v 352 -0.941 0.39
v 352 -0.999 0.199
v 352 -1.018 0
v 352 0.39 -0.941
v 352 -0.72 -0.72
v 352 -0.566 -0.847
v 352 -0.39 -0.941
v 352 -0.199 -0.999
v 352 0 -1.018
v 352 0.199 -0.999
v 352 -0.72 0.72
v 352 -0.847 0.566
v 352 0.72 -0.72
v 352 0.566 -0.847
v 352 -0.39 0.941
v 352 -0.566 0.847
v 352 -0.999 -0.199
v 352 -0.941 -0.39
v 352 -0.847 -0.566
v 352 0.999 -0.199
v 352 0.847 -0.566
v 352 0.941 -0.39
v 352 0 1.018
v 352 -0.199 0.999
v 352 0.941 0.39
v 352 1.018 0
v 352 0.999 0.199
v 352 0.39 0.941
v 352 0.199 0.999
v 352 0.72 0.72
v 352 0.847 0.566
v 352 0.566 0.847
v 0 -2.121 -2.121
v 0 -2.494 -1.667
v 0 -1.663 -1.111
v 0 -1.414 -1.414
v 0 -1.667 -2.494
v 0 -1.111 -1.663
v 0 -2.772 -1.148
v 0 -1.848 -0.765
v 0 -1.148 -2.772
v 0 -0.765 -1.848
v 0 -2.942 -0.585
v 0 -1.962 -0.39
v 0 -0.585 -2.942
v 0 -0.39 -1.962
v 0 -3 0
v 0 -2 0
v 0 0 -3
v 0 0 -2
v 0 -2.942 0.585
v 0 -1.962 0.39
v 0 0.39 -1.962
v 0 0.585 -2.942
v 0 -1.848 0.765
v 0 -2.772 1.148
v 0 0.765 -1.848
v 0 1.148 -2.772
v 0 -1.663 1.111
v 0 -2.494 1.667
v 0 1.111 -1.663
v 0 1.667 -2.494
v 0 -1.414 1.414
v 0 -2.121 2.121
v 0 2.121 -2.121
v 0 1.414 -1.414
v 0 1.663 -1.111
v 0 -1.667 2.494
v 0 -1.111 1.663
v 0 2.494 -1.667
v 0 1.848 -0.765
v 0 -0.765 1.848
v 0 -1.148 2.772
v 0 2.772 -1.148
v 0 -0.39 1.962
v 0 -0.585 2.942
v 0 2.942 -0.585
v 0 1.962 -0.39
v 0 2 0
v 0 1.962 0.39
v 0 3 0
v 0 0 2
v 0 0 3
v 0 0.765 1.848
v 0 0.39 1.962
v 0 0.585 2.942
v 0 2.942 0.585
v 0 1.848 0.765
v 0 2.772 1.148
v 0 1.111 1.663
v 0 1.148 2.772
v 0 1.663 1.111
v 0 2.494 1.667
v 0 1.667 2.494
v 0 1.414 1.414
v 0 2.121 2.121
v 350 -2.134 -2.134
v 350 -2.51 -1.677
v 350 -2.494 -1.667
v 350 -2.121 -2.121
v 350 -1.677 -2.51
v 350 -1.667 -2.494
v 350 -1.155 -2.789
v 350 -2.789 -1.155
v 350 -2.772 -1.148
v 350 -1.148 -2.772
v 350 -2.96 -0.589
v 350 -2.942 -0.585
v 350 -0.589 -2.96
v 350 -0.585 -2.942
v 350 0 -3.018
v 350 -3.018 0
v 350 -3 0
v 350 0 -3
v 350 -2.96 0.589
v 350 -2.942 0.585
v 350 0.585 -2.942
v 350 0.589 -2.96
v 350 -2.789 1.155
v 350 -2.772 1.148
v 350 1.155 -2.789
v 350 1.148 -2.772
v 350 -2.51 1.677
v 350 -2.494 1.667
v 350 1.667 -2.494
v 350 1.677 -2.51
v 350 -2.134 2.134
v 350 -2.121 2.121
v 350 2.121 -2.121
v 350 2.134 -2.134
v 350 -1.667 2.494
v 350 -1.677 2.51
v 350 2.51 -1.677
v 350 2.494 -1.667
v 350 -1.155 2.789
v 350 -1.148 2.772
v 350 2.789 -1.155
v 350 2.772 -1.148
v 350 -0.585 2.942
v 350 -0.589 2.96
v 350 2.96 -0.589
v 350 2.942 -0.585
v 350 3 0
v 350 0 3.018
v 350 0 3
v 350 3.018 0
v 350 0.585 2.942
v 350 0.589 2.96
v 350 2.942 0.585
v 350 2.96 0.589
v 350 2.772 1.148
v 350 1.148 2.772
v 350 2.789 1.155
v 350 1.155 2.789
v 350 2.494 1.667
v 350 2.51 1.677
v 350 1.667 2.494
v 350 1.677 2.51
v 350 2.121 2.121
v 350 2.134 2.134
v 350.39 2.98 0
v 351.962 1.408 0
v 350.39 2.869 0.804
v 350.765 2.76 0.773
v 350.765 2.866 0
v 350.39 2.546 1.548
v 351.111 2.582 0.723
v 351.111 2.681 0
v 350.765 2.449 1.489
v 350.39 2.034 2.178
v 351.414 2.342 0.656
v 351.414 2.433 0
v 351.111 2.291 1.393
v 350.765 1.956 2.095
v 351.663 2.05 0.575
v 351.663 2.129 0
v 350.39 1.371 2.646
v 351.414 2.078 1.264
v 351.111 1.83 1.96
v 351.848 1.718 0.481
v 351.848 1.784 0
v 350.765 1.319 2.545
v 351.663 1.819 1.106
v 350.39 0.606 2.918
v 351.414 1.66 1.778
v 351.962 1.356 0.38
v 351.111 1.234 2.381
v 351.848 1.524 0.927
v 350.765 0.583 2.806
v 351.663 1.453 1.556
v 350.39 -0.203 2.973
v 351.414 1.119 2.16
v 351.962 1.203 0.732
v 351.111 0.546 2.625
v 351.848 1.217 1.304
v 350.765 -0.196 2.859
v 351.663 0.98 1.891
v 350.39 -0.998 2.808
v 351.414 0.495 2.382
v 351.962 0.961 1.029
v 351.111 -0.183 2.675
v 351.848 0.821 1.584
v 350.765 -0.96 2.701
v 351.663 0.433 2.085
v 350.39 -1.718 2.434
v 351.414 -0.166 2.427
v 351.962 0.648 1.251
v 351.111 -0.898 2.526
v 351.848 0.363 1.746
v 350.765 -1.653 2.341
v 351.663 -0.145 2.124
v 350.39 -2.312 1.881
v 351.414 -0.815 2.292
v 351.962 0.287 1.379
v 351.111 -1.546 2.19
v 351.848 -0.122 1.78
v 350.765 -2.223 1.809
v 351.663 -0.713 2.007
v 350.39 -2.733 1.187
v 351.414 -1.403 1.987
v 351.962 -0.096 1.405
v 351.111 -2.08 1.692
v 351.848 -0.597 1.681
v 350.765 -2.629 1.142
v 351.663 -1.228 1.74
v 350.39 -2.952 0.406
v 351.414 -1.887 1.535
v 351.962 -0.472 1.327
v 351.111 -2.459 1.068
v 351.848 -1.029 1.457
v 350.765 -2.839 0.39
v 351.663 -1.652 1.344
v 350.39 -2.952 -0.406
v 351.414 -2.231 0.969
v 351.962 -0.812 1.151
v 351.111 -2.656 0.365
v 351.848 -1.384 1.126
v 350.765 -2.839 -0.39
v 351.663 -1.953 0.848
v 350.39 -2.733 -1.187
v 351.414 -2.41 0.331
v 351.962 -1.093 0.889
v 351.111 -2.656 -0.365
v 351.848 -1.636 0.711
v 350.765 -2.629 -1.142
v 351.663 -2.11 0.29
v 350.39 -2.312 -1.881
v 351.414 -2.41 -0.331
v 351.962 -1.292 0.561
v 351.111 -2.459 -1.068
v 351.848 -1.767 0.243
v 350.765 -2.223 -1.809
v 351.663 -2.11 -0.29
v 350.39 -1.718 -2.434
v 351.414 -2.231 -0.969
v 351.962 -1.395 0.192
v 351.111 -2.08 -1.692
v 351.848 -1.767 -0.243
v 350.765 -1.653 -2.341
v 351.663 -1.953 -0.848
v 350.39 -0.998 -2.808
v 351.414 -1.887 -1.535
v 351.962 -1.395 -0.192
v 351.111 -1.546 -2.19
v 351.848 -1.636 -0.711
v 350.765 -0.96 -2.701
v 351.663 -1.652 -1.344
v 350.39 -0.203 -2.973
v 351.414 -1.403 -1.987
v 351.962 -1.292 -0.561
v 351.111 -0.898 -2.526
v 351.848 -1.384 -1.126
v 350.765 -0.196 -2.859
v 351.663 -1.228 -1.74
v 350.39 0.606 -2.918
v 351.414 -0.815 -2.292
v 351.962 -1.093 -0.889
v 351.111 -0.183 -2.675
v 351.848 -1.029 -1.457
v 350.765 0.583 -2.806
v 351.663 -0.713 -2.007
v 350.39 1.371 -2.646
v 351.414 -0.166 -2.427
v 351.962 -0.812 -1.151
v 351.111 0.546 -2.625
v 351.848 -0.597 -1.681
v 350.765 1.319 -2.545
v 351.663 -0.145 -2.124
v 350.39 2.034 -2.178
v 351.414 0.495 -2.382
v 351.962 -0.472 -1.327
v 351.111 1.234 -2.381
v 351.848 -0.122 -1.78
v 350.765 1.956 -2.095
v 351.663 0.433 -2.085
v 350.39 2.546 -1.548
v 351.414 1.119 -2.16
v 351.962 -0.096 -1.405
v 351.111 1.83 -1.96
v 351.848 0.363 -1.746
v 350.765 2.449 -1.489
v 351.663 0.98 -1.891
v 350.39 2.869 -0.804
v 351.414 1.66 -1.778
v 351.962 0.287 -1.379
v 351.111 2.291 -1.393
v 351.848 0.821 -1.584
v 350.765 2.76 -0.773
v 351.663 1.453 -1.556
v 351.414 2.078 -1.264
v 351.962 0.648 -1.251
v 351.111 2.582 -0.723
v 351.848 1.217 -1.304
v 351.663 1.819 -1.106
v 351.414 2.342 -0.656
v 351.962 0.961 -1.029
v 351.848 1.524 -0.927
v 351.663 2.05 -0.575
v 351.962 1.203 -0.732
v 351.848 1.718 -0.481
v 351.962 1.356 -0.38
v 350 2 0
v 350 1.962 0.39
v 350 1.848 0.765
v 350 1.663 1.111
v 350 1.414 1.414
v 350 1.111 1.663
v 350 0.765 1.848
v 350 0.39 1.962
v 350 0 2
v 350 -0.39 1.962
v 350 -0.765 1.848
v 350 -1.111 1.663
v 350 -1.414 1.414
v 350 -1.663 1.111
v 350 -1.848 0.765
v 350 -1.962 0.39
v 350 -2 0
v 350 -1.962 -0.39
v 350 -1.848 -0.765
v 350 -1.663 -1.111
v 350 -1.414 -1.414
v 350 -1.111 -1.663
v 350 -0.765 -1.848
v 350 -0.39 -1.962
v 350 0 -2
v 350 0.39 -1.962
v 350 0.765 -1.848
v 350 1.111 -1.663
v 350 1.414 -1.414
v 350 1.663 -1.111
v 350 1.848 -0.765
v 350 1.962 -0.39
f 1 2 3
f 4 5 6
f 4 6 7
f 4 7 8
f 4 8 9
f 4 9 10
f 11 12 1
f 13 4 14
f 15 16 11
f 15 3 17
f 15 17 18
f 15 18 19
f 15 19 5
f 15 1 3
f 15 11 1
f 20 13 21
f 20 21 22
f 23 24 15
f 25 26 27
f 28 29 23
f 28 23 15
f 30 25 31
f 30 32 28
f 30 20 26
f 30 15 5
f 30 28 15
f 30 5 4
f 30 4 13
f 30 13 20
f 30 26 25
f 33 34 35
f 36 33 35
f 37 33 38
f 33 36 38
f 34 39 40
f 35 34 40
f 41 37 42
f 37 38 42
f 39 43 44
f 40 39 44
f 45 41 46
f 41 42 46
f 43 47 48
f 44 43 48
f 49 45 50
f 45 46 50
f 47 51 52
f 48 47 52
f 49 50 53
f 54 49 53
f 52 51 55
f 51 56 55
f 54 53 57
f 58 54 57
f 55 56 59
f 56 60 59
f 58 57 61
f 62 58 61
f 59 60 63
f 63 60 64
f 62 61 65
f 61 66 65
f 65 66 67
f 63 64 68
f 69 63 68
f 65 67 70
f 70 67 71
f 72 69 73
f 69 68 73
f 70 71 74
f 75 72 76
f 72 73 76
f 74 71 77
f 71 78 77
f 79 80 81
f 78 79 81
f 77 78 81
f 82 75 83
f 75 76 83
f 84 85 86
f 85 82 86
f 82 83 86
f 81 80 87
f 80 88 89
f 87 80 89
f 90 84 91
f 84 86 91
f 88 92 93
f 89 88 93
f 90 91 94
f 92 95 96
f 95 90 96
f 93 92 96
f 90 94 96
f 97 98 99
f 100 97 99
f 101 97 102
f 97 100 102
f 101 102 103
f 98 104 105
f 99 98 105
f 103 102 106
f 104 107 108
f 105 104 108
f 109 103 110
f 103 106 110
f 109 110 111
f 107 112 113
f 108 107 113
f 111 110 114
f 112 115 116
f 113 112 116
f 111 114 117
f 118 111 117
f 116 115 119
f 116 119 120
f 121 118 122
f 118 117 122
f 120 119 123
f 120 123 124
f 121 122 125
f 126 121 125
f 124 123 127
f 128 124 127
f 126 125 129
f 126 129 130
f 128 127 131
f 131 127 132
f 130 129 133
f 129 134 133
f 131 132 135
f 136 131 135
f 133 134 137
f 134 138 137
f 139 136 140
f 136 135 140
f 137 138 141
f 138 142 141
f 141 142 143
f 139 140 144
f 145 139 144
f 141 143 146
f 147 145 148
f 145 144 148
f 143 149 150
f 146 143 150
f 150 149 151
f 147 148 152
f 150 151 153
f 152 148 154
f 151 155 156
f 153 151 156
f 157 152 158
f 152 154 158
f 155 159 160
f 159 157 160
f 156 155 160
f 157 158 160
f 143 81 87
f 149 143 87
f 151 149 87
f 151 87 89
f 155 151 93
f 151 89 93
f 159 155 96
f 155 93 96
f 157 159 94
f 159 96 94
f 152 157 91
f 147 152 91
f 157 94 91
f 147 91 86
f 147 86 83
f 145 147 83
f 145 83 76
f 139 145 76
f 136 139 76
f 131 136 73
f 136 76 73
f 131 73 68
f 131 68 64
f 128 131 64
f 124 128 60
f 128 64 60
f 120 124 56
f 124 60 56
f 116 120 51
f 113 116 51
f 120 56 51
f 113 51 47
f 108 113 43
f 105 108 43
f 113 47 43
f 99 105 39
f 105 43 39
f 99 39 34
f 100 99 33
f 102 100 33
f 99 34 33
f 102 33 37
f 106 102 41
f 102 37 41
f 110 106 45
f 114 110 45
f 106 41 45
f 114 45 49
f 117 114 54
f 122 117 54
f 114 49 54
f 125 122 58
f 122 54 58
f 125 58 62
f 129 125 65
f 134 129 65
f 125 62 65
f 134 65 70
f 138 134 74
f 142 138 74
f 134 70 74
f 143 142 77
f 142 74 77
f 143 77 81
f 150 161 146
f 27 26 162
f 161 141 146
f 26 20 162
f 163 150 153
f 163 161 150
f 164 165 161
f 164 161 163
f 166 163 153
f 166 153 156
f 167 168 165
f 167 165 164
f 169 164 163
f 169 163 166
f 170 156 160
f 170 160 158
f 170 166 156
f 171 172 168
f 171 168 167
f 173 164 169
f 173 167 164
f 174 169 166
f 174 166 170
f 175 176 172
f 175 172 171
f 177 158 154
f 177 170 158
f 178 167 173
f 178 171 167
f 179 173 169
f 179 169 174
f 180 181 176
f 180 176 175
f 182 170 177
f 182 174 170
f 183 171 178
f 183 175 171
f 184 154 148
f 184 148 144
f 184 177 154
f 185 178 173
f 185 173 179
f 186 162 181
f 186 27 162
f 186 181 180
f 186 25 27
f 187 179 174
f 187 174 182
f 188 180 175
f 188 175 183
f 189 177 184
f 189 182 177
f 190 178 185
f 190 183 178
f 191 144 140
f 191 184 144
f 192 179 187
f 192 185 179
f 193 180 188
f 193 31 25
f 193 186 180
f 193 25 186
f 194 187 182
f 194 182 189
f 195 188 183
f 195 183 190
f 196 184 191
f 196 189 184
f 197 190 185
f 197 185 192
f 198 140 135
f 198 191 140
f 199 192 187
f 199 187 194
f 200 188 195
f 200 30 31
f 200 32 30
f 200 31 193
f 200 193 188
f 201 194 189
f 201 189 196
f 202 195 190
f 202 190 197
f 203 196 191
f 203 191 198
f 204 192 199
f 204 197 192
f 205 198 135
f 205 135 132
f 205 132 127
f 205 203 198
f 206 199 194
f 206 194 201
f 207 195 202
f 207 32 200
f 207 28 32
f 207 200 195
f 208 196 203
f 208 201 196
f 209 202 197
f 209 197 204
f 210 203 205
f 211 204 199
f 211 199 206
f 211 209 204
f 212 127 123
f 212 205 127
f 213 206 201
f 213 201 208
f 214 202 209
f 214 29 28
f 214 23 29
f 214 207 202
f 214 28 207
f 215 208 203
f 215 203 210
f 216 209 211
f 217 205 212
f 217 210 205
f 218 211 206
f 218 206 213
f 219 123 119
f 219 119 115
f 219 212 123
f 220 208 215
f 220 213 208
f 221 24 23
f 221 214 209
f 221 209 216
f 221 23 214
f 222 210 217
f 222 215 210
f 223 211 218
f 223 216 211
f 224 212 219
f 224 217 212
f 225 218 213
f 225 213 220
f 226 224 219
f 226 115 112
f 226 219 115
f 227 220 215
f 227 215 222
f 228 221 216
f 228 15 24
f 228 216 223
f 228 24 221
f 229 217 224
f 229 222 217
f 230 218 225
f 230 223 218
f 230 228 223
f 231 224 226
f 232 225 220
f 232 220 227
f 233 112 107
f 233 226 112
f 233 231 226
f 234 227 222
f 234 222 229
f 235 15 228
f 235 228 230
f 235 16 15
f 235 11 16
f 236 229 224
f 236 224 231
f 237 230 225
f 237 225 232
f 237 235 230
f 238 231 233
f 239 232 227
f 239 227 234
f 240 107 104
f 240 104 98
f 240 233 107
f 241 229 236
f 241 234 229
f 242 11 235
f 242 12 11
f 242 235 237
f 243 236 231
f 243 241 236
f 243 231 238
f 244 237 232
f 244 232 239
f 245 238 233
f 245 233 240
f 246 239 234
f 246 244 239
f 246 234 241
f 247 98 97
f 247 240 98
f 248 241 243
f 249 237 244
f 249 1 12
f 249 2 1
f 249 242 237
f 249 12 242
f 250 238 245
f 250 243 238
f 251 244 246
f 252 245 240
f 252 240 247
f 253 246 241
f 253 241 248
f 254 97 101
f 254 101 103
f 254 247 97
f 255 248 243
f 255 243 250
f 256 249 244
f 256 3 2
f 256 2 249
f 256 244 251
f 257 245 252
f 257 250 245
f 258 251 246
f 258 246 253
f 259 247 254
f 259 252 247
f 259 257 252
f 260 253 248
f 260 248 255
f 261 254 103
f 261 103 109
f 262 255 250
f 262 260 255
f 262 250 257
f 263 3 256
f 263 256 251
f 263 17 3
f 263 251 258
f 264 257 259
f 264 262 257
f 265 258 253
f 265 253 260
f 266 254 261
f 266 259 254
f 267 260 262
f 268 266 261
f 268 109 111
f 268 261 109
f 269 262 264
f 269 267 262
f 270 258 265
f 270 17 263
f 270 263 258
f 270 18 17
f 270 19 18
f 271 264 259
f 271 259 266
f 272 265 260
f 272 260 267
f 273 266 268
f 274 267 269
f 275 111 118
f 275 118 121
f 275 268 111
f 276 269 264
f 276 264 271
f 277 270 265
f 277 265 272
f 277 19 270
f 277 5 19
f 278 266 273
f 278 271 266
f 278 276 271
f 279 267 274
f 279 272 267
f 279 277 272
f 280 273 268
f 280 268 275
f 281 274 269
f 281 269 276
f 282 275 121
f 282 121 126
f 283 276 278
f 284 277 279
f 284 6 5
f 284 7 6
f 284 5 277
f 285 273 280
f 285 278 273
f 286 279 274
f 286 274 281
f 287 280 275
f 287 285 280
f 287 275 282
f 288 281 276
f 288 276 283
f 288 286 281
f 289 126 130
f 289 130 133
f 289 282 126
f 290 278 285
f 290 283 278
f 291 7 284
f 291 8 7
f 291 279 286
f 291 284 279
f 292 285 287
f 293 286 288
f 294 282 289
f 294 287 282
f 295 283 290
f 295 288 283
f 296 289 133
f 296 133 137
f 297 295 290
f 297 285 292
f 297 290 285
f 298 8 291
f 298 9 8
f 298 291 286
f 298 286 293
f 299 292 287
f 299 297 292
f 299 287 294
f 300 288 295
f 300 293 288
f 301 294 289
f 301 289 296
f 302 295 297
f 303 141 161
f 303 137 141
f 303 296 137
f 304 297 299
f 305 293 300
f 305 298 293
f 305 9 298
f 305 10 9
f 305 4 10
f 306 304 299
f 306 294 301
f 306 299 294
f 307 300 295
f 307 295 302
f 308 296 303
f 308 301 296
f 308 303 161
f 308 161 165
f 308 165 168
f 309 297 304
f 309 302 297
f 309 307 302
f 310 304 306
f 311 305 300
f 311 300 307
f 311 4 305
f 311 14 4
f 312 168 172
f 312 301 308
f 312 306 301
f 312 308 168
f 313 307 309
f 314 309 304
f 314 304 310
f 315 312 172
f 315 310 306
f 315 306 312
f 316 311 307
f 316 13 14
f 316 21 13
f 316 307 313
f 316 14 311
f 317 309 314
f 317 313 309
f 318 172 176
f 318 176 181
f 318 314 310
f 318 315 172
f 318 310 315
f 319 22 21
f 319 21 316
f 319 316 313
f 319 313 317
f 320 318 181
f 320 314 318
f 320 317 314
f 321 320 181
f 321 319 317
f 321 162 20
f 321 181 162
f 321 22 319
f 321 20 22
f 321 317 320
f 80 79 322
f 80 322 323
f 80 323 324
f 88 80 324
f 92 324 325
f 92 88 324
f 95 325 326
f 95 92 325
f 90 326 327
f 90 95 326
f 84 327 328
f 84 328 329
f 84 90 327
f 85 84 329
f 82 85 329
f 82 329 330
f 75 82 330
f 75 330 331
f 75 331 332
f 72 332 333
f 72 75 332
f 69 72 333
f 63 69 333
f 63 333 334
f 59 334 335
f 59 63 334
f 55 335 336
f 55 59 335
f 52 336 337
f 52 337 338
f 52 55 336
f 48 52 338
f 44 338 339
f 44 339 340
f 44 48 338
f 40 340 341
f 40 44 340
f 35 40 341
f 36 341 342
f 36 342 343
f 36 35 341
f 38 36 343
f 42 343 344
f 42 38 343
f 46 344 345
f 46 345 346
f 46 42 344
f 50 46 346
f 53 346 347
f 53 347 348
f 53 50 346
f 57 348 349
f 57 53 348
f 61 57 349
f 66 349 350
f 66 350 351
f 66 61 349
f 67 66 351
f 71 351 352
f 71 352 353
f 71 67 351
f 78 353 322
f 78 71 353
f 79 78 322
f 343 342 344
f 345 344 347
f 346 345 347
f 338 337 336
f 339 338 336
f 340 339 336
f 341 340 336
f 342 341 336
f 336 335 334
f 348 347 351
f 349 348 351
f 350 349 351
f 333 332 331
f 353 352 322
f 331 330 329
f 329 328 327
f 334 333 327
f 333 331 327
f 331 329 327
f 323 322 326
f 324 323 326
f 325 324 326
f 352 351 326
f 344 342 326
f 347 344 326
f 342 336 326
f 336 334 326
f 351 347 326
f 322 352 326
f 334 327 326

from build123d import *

# Parameters (mm, degrees)
F0_R     = 3
F0_R_2   = 2
F1_DEPTH = 350
F2_R     = 3.0183078128
F3_DEPTH = 2
F4_R     = 1.99999


# Not quite as in the source:
# - a fillet or chamfer is up to 0.001 mm smaller than in the source, because OpenCascade refuses the exact size


with BuildPart() as f1:
    # F0 (on Right) → F1 (new body)
    with BuildSketch(Plane.YZ):
        Circle(F0_R)
        Circle(F0_R_2, mode=Mode.SUBTRACT)
    extrude(amount=F1_DEPTH)

    # F2 (on face) → F3 (join)
    with BuildSketch(Plane.YZ.offset(350)):
        Circle(F2_R)
    extrude(amount=F3_DEPTH)

    # F4 (radius 2 in the source; OpenCascade refuses exactly that, so slightly less here)
    f4_edges = [f1.edges().sort_by_distance(p)[0] for p in [
        (352, -3.018308, 0),
    ]]
    fillet(f4_edges, radius=F4_R)


solid = f1.part
